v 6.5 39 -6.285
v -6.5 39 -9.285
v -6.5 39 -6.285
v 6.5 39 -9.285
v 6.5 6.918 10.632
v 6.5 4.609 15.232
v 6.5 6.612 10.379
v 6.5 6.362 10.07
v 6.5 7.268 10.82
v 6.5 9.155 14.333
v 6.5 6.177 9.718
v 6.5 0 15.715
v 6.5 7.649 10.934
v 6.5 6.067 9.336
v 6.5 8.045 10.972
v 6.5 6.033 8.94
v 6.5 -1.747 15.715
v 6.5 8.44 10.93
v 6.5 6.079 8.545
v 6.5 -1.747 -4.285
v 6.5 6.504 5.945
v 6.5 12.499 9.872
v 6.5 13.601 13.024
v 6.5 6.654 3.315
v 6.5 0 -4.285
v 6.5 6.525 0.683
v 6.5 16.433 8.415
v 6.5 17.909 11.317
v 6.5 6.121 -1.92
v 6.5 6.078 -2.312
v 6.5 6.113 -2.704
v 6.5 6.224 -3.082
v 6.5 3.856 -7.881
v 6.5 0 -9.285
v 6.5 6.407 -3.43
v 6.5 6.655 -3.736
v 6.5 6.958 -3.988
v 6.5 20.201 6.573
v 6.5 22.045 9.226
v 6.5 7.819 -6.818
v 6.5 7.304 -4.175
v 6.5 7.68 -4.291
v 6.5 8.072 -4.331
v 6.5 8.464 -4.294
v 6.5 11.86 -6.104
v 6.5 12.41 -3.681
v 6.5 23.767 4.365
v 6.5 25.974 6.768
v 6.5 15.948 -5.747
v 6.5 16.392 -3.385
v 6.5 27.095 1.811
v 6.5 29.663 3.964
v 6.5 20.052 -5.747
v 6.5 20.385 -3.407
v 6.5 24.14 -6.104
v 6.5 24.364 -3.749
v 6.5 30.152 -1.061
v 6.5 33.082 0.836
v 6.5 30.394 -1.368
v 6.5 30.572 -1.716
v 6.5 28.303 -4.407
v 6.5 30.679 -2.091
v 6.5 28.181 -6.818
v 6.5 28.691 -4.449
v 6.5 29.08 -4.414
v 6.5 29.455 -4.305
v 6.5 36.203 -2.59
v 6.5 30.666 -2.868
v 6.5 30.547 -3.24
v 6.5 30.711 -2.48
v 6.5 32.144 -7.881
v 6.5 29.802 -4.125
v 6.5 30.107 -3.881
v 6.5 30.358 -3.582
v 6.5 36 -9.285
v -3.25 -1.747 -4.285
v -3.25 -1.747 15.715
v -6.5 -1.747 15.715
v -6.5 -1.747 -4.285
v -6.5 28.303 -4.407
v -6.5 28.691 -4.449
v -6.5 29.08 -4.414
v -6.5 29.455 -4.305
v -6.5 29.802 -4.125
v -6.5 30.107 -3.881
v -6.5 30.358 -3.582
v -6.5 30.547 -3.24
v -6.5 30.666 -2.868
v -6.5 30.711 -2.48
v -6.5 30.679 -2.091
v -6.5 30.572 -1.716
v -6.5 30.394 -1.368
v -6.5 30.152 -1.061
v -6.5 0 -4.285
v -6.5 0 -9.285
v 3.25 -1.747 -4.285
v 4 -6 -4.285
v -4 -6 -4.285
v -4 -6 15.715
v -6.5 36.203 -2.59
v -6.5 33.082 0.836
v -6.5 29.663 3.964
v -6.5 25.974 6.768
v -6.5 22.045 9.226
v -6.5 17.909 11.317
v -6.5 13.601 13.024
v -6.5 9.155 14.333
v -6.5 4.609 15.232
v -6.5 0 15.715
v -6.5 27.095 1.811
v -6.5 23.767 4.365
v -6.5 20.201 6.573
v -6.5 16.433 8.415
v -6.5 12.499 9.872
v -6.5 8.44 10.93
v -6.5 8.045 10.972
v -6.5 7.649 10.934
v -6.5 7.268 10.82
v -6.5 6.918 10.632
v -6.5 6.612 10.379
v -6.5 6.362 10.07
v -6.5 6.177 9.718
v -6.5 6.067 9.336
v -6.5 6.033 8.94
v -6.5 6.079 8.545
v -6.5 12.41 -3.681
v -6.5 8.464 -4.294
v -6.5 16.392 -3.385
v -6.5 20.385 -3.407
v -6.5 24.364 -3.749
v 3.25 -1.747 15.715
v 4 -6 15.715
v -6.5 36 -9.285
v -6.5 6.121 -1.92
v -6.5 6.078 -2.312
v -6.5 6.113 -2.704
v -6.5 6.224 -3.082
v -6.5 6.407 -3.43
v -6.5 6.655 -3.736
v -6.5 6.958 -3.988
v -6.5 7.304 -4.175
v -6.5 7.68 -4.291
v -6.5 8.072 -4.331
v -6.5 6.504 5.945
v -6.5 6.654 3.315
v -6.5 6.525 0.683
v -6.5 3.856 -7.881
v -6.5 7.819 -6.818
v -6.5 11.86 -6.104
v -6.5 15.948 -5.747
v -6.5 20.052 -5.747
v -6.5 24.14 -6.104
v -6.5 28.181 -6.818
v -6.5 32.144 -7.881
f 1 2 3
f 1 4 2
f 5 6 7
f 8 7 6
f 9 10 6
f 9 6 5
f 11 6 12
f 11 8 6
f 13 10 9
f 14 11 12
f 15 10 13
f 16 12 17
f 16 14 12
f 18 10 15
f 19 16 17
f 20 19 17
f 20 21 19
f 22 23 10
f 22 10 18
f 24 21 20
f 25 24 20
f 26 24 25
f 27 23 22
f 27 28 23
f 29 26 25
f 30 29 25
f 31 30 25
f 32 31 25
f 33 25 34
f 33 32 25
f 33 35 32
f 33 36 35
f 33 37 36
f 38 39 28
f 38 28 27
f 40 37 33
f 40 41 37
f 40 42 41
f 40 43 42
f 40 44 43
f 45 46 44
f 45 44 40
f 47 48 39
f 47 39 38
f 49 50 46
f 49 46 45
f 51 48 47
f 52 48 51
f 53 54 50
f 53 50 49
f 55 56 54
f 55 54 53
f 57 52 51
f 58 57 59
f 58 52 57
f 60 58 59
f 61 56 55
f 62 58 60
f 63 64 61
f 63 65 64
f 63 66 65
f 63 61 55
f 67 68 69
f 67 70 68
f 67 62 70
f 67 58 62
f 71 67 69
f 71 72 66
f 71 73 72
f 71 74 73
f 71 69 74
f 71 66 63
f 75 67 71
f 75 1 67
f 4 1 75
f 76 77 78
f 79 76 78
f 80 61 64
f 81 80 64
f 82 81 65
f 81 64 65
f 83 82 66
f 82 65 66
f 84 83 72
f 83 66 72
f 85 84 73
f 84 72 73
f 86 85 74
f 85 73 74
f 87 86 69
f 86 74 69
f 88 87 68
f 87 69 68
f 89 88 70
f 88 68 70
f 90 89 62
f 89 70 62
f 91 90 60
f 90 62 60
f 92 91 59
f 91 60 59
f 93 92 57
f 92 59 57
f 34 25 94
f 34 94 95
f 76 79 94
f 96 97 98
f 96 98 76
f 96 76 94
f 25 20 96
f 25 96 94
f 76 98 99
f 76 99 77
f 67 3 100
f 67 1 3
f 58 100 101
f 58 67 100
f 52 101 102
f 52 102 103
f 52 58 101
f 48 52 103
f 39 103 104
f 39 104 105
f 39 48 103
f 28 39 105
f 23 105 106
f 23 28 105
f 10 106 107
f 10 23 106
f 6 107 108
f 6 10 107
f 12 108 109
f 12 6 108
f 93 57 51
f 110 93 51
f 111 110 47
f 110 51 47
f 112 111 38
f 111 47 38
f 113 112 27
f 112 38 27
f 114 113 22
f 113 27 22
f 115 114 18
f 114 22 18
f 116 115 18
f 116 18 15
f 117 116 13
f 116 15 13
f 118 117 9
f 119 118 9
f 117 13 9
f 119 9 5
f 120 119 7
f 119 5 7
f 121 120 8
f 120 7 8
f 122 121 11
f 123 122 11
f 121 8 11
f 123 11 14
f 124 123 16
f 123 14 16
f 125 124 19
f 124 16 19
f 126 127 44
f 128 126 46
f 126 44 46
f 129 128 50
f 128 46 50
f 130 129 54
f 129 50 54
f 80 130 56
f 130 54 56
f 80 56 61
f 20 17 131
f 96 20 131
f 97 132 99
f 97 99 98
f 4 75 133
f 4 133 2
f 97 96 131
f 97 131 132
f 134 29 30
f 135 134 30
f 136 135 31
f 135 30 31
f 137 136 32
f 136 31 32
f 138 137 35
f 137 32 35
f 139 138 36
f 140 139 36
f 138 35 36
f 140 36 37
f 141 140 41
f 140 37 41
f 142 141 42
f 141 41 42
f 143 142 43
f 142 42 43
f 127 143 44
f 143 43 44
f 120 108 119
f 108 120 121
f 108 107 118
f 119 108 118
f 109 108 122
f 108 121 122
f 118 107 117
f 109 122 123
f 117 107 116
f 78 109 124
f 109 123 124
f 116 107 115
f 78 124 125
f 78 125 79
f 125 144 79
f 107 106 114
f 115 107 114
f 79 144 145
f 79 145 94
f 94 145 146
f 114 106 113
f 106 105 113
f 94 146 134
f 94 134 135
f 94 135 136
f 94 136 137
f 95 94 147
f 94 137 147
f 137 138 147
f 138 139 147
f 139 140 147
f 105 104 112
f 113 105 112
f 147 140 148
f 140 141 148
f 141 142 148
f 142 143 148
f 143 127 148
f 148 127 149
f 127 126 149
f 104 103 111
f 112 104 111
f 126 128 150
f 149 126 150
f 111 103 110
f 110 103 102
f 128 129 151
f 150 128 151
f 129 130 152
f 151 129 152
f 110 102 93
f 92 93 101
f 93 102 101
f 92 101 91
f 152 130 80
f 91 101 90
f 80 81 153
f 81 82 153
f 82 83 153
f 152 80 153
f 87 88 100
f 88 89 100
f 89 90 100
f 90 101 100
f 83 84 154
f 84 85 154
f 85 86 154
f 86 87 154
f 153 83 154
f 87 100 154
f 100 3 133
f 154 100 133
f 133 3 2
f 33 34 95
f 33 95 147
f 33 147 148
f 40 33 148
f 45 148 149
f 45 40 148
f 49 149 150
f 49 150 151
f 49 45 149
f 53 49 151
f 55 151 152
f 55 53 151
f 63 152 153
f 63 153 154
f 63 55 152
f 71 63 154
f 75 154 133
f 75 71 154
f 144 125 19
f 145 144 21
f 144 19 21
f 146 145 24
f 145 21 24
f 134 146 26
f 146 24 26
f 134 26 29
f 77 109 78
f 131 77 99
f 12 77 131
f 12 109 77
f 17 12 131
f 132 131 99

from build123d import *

# Parameters (mm, degrees)
BOSS_EXTRUDE2_DEPTH = 6.5
CUT_EXTRUDE1_DEPTH  = 47.778734485
CUT_EXTRUDE2_DEPTH  = 45.010875493


with BuildPart() as part:
    # Sketch2 → Boss-Extrude2 (new, symmetric)
    with BuildSketch(Plane(origin=(0, 0, 0), x_dir=(0, 0, -1), z_dir=(1, 0, 0))):
        with BuildLine():
            Line((-15.714870718, 0), (-15.714870718, -6))
            Line((-15.714870718, -6), (4.285129282, -6))
            Line((4.285129282, -6), (4.285129282, 0))
            Line((4.285129282, 0), (9.285129282, 0))
            ThreePointArc((9.285129282, 0), (5.701715974, 18), (9.285129282, 36))
            Line((9.285129282, 36), (9.285129282, 39))
            Line((9.285129282, 39), (6.285129282, 39))
            ThreePointArc((6.285129282, 39), (-9.226389961, 22.044959573), (-15.714870718, 0))
        make_face()
    extrude(amount=BOSS_EXTRUDE2_DEPTH, both=True)

    # Sketch3 → Cut-Extrude1 (cut, through all)
    with BuildSketch(Plane.XY.offset(15.714870718)):
        Polygon((6.5, -6), (6.5, -1.746538635), (3.25, -1.746538635), (4, -6), align=None)
        Polygon((-6.5, -6), (-4, -6), (-3.25, -1.746538635), (-6.5, -1.746538635), align=None)
    extrude(amount=-CUT_EXTRUDE1_DEPTH, mode=Mode.SUBTRACT)

    # Sketch4 → Cut-Extrude2 (cut, through all)
    with BuildSketch(Plane(origin=(6.5, 0, 0), x_dir=(0, 0, -1), z_dir=(1, 0, 0))):
        with BuildLine():
            ThreePointArc((4.293654014, 8.463820333), (3.356236623, 18.389014044), (4.406551478, 28.302896243))
            ThreePointArc((4.406551478, 28.302896243), (3.415993904, 30.4613018), (1.061425552, 30.151581393))
            ThreePointArc((1.061425552, 30.151581393), (-6.57340708, 20.201122888), (-10.929733391, 8.439970103))
            ThreePointArc((-10.929733391, 8.439970103), (-10.378680687, 6.611841621), (-8.545133867, 6.07909507))
            ThreePointArc((-8.545133867, 6.07909507), (-3.314593754, 6.65373917), (1.920364292, 6.120841452))
            ThreePointArc((1.920364292, 6.120841452), (3.736278671, 6.654920589), (4.293654014, 8.463820333))
        make_face()
    extrude(amount=-CUT_EXTRUDE2_DEPTH, mode=Mode.SUBTRACT)


solid = part.part
